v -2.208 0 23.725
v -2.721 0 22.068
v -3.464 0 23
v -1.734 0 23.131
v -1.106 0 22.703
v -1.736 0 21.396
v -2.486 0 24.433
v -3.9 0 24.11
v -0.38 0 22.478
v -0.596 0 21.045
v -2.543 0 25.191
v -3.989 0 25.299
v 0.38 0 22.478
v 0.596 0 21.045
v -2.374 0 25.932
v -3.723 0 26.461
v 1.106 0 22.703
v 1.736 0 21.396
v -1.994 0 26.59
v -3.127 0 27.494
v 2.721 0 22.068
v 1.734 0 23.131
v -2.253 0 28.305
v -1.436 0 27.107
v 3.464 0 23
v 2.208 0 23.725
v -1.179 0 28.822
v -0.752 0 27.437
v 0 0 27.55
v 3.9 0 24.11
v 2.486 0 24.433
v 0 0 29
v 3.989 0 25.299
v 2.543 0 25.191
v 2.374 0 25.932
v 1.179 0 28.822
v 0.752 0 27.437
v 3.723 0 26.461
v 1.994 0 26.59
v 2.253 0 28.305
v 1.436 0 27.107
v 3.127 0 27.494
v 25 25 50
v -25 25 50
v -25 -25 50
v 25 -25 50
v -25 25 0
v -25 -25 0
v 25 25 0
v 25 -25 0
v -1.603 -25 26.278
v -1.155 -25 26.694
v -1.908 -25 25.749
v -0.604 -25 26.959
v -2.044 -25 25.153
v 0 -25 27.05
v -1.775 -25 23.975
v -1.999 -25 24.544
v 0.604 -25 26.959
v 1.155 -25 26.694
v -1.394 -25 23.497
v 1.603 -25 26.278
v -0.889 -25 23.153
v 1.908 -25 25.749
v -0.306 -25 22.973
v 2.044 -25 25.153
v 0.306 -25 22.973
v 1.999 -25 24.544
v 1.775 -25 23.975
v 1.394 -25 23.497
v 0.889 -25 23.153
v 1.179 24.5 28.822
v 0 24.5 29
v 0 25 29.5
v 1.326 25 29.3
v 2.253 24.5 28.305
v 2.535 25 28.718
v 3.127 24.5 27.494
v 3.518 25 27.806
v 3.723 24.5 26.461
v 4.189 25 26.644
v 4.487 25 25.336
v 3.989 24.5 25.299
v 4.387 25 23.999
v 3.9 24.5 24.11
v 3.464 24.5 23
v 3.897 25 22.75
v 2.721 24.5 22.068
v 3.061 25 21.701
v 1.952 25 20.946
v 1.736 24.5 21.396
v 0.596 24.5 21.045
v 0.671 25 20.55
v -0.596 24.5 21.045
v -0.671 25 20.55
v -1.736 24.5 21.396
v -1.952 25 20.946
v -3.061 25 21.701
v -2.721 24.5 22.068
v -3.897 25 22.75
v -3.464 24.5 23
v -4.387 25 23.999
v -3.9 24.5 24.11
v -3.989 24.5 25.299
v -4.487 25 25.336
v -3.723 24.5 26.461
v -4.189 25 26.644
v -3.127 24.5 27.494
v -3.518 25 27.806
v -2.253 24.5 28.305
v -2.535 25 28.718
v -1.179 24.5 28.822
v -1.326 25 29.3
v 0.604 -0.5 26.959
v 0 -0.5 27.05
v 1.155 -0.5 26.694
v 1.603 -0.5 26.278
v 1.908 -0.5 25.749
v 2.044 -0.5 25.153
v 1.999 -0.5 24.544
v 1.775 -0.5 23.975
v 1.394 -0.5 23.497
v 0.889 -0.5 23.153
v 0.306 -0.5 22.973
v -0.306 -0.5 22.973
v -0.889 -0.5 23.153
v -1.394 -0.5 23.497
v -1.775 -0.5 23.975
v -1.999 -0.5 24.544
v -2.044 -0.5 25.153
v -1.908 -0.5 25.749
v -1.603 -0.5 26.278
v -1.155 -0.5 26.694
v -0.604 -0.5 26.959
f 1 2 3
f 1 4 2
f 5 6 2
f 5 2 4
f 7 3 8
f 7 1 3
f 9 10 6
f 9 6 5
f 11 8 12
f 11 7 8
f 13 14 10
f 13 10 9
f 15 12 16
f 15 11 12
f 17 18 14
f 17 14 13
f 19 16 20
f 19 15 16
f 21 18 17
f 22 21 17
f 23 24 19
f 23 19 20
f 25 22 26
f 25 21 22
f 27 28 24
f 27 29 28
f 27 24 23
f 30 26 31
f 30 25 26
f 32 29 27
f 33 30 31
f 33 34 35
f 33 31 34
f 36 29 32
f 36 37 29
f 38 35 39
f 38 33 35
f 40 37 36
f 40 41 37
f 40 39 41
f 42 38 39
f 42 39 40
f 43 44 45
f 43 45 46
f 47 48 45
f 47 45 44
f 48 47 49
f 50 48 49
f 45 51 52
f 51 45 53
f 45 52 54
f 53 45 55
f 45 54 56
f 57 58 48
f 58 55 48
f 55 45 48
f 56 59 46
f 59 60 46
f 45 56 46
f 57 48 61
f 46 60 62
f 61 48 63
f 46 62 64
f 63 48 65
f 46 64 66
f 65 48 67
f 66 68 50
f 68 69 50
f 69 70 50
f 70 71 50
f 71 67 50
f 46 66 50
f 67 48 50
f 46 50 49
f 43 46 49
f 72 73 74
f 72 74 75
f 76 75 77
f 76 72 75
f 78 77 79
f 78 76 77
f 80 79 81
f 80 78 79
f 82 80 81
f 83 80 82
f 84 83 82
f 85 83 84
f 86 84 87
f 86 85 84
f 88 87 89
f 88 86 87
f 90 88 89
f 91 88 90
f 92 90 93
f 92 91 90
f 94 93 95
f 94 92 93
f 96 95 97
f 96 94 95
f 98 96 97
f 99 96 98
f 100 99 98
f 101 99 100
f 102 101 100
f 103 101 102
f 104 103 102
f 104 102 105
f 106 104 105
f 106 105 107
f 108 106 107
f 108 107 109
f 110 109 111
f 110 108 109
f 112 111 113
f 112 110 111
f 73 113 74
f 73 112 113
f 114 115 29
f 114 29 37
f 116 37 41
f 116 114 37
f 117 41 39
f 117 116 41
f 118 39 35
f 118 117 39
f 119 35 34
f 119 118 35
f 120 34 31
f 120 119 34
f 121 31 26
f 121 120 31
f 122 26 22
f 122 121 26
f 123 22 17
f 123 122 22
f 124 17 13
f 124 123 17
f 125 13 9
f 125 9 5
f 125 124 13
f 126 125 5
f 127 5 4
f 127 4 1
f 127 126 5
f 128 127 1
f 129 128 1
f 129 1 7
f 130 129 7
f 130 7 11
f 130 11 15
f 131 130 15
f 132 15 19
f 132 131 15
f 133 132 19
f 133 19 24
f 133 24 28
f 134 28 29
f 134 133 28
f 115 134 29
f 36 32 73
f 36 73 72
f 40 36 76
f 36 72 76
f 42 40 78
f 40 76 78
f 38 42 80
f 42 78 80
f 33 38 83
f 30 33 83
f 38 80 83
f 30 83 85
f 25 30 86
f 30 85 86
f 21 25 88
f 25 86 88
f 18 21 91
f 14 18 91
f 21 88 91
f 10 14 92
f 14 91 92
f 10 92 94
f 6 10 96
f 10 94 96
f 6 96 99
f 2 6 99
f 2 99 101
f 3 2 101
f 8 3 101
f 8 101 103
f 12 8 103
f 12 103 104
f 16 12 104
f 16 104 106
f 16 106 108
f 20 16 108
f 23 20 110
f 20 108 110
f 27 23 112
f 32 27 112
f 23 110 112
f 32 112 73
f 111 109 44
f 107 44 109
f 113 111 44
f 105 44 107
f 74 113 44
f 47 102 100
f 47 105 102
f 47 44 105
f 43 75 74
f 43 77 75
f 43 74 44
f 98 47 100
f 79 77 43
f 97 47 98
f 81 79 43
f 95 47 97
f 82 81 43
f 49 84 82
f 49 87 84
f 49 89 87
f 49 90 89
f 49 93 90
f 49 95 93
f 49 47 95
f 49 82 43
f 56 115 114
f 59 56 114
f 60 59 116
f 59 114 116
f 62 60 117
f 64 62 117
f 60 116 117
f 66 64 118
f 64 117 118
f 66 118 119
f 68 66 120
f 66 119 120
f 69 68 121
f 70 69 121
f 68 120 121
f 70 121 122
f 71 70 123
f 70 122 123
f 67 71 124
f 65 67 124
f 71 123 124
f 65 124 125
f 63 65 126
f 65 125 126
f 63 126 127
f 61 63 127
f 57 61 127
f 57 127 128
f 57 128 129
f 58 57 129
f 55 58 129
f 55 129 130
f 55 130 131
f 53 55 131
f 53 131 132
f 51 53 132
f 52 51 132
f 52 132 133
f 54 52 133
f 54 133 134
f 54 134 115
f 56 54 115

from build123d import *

# Parameters (mm, degrees)
SKICA1_W                 = 50
SKICA1_H                 = 50
P_IDAT_VYSUNUT_M1_DEPTH  = 50
SKICA2_R                 = 2.05
ODEBRAT_VYSUNUT_M1_DEPTH = 50
SKICA3_R                 = 4
ODEBRAT_VYSUNUT_M2_DEPTH = 25
ZKOSEN_1_SIZE            = 0.5
ZKOSEN_2_SIZE            = 0.5


with BuildPart() as part:
    # Skica1 → Přidat vysunutím1 (new body)
    with BuildSketch(Plane.XY):
        Rectangle(SKICA1_W, SKICA1_H)
    extrude(amount=P_IDAT_VYSUNUT_M1_DEPTH)

    # Skica2 → Odebrat vysunutím1 (cut)
    with BuildSketch(Plane(origin=(0, 25, 0), x_dir=(1, 0, 0), z_dir=(0, 1, 0))):
        with Locations(Location((0, -25, 0), (0, 0, 270))):
            Circle(SKICA2_R)
    extrude(amount=-ODEBRAT_VYSUNUT_M1_DEPTH, mode=Mode.SUBTRACT)

    # Skica3 → Odebrat vysunutím2 (cut)
    with BuildSketch(Plane(origin=(0, 25, 0), x_dir=(1, 0, 0), z_dir=(0, 1, 0))):
        with Locations(Location((0, -25, 0), (0, 0, 270))):
            Circle(SKICA3_R)
    extrude(amount=-ODEBRAT_VYSUNUT_M2_DEPTH, mode=Mode.SUBTRACT)

    # Zkosení1
    zkosen_1_edges = [part.edges().sort_by_distance(p)[0] for p in [
        (0, 25, 21),
    ]]
    chamfer(zkosen_1_edges, length=ZKOSEN_1_SIZE)

    # Zkosení2
    zkosen_2_edges = [part.edges().sort_by_distance(p)[0] for p in [
        (0, 0, 22.95),
    ]]
    chamfer(zkosen_2_edges, length=ZKOSEN_2_SIZE)


solid = part.part
